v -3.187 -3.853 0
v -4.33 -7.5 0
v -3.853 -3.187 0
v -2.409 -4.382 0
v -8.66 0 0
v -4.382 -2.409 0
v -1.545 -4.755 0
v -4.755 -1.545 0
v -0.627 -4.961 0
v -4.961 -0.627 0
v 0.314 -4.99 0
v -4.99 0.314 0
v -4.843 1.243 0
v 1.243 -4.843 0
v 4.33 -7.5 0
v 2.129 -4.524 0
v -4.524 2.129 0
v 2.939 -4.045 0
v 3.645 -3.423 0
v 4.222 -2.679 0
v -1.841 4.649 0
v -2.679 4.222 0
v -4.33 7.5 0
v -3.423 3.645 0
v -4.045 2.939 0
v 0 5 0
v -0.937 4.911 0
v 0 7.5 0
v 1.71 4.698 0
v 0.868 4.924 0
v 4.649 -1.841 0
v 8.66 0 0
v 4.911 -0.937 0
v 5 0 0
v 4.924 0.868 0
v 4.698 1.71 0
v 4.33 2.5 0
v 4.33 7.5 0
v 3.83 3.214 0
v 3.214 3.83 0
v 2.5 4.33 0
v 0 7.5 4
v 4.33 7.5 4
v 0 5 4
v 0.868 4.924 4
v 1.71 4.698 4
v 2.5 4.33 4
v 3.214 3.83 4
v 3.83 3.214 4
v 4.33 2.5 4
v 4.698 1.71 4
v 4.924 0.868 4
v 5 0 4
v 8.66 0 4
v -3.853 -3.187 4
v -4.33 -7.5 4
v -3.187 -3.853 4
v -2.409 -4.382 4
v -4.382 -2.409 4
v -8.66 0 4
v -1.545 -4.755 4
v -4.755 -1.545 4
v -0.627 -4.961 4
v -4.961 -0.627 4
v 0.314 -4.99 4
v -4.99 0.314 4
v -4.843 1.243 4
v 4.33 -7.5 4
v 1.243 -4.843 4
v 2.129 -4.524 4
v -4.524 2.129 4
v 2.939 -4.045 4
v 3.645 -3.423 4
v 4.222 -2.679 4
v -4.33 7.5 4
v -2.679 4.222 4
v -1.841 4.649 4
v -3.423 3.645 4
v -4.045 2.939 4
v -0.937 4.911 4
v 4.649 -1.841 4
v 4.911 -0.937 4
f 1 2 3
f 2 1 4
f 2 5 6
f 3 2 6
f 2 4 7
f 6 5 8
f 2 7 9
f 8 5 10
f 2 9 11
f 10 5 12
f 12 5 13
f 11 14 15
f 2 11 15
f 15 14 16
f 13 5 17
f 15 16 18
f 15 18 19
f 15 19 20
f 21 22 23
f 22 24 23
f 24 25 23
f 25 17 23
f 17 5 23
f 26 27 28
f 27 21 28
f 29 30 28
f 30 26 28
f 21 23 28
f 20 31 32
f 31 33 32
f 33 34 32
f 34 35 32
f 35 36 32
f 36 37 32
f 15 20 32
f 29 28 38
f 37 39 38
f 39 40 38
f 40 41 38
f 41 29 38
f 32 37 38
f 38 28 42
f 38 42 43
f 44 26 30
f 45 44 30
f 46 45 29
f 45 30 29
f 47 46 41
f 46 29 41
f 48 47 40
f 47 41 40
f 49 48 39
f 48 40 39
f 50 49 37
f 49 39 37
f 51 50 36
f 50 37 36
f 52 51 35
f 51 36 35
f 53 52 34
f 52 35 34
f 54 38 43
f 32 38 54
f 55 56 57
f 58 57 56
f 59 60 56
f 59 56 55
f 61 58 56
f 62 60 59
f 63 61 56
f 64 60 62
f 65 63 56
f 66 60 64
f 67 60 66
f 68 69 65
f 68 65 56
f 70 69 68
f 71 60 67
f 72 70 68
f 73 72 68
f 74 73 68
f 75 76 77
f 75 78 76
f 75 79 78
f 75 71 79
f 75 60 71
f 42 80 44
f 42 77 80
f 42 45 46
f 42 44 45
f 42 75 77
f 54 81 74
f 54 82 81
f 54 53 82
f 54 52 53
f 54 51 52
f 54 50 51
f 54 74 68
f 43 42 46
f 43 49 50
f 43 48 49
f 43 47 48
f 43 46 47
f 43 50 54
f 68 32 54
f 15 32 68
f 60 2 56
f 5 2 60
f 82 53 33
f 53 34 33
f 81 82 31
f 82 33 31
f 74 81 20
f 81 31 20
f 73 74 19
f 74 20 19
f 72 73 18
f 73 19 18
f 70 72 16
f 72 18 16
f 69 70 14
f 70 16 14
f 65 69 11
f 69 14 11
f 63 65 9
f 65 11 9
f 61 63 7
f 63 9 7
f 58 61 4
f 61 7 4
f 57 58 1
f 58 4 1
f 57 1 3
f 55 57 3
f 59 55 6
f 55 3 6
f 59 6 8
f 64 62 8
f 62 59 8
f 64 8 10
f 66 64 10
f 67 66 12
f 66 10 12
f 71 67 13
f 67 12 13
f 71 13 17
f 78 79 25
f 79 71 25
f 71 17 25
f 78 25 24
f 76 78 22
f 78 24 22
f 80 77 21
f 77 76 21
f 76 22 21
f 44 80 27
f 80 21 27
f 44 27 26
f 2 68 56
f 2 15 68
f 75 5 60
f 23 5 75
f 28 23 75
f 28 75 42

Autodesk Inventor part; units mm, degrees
ref_plane "YZ Plane" through (0, 0, 0) normal (1, 0, 0) x (0, 1, 0)
ref_plane "XZ Plane" through (0, 0, 0) normal (0, 1, 0) x (-1, 0, 0)
ref_plane "XY Plane" through (0, 0, 0) normal (0, 0, 1) x (1, 0, 0)
sketch "草图1" plane through (0, 0, 0) normal (0, 0, 1) x (1, 0, 0)
  circle A0 centre (0, 0) radius 5
  line L0 (4.3301, -7.5) -> (-4.3301, -7.5)
  line L1 (-4.3301, -7.5) -> (-8.6603, 0)
  line L2 (-8.6603, 0) -> (-4.3301, 7.5)
  line L3 (-4.3301, 7.5) -> (4.3301, 7.5)
  line L4 (4.3301, 7.5) -> (8.6603, 0)
  line L5 (8.6603, 0) -> (4.3301, -7.5)
  line L6 (0, 0) -> (0, 7.5)
  dimension "d0" = 10
  dimension "d1" = 15
extrude "拉伸1" add sketch "草图1" along normal blind 4
thread "螺纹1" size "M10x1.5" class "6H" standard "ANSI Metric M Profile" full length
properties part number "刀轴带动盘连杆销螺帽"
